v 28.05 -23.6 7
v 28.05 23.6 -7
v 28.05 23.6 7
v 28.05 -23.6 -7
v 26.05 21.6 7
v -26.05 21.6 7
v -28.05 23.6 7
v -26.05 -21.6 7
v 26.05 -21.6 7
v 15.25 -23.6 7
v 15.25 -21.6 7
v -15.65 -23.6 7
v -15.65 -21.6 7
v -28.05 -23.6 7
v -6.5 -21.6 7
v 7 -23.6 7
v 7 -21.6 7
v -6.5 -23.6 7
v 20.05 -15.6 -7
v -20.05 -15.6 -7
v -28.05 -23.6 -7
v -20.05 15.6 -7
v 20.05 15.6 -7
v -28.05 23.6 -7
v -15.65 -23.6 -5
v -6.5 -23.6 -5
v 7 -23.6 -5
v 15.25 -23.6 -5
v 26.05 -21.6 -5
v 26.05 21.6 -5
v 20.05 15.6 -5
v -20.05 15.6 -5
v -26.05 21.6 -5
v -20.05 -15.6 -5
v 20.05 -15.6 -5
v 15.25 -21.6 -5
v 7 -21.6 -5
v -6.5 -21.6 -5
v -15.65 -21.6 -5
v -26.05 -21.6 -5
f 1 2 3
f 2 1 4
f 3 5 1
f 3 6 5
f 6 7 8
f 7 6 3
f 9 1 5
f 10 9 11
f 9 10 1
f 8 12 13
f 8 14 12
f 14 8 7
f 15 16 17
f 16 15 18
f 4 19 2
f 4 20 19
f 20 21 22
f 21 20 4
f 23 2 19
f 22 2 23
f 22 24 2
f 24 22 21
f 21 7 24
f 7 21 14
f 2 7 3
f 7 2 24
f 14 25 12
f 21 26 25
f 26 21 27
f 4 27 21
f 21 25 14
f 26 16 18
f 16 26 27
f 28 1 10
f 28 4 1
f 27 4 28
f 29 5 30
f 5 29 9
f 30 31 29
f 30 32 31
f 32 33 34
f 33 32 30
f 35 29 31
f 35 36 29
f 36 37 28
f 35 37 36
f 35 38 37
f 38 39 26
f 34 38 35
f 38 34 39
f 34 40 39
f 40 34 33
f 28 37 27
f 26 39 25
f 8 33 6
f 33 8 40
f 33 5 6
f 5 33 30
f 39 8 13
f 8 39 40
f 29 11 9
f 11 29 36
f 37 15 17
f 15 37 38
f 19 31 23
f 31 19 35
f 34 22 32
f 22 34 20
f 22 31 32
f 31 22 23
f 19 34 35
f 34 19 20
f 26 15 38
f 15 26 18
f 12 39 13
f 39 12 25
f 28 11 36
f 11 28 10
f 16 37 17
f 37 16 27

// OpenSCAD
arduino_width = 52.1;
arduino_length = 43.2;
arduino_usb_width = 19.55 - 10.4;
arduino_usb_height = 15;
arduino_usb_x = 10.4;
arduino_power_width = 19.05 - 10.8;
arduino_power_height = 16;
arduino_power_x = 10.8;

wall_thickness = 2;
wall_height = 12;
bottom_thickness = 2;
side_shoulder = 6;

difference()
{
	// Exterior box
	cube([arduino_width+(2*wall_thickness),arduino_length+(2*wall_thickness),wall_height+bottom_thickness], center=true);

	// Interior recess
	translate([0,0,bottom_thickness/2.0])
		cube([arduino_width,arduino_length,wall_height], center=true);

	// Bottom hole
	cube([arduino_width-(2*side_shoulder),arduino_length-(2*side_shoulder),wall_height+bottom_thickness], center=true);

	// USB hole
	translate([	-1*((arduino_width/2.0)-(arduino_usb_width/2.0)-arduino_usb_x),
			-1*(arduino_length/2.0)-(wall_thickness/2.0),
			-1*(wall_height/2.0 - arduino_usb_height/2.0)+bottom_thickness/2.0])
	{
		cube([arduino_usb_width,wall_thickness*2,arduino_usb_height], center=true);
	}

	// Power hole
	translate([	((arduino_width/2.0)-(arduino_power_width/2.0)-arduino_power_x),
			-1*(arduino_length/2.0)-(wall_thickness/2.0),
			-1*(wall_height/2.0 - arduino_power_height/2.0)+bottom_thickness/2.0])
	{
		cube([arduino_power_width,wall_thickness*2,arduino_power_height], center=true);
	}
	
}
